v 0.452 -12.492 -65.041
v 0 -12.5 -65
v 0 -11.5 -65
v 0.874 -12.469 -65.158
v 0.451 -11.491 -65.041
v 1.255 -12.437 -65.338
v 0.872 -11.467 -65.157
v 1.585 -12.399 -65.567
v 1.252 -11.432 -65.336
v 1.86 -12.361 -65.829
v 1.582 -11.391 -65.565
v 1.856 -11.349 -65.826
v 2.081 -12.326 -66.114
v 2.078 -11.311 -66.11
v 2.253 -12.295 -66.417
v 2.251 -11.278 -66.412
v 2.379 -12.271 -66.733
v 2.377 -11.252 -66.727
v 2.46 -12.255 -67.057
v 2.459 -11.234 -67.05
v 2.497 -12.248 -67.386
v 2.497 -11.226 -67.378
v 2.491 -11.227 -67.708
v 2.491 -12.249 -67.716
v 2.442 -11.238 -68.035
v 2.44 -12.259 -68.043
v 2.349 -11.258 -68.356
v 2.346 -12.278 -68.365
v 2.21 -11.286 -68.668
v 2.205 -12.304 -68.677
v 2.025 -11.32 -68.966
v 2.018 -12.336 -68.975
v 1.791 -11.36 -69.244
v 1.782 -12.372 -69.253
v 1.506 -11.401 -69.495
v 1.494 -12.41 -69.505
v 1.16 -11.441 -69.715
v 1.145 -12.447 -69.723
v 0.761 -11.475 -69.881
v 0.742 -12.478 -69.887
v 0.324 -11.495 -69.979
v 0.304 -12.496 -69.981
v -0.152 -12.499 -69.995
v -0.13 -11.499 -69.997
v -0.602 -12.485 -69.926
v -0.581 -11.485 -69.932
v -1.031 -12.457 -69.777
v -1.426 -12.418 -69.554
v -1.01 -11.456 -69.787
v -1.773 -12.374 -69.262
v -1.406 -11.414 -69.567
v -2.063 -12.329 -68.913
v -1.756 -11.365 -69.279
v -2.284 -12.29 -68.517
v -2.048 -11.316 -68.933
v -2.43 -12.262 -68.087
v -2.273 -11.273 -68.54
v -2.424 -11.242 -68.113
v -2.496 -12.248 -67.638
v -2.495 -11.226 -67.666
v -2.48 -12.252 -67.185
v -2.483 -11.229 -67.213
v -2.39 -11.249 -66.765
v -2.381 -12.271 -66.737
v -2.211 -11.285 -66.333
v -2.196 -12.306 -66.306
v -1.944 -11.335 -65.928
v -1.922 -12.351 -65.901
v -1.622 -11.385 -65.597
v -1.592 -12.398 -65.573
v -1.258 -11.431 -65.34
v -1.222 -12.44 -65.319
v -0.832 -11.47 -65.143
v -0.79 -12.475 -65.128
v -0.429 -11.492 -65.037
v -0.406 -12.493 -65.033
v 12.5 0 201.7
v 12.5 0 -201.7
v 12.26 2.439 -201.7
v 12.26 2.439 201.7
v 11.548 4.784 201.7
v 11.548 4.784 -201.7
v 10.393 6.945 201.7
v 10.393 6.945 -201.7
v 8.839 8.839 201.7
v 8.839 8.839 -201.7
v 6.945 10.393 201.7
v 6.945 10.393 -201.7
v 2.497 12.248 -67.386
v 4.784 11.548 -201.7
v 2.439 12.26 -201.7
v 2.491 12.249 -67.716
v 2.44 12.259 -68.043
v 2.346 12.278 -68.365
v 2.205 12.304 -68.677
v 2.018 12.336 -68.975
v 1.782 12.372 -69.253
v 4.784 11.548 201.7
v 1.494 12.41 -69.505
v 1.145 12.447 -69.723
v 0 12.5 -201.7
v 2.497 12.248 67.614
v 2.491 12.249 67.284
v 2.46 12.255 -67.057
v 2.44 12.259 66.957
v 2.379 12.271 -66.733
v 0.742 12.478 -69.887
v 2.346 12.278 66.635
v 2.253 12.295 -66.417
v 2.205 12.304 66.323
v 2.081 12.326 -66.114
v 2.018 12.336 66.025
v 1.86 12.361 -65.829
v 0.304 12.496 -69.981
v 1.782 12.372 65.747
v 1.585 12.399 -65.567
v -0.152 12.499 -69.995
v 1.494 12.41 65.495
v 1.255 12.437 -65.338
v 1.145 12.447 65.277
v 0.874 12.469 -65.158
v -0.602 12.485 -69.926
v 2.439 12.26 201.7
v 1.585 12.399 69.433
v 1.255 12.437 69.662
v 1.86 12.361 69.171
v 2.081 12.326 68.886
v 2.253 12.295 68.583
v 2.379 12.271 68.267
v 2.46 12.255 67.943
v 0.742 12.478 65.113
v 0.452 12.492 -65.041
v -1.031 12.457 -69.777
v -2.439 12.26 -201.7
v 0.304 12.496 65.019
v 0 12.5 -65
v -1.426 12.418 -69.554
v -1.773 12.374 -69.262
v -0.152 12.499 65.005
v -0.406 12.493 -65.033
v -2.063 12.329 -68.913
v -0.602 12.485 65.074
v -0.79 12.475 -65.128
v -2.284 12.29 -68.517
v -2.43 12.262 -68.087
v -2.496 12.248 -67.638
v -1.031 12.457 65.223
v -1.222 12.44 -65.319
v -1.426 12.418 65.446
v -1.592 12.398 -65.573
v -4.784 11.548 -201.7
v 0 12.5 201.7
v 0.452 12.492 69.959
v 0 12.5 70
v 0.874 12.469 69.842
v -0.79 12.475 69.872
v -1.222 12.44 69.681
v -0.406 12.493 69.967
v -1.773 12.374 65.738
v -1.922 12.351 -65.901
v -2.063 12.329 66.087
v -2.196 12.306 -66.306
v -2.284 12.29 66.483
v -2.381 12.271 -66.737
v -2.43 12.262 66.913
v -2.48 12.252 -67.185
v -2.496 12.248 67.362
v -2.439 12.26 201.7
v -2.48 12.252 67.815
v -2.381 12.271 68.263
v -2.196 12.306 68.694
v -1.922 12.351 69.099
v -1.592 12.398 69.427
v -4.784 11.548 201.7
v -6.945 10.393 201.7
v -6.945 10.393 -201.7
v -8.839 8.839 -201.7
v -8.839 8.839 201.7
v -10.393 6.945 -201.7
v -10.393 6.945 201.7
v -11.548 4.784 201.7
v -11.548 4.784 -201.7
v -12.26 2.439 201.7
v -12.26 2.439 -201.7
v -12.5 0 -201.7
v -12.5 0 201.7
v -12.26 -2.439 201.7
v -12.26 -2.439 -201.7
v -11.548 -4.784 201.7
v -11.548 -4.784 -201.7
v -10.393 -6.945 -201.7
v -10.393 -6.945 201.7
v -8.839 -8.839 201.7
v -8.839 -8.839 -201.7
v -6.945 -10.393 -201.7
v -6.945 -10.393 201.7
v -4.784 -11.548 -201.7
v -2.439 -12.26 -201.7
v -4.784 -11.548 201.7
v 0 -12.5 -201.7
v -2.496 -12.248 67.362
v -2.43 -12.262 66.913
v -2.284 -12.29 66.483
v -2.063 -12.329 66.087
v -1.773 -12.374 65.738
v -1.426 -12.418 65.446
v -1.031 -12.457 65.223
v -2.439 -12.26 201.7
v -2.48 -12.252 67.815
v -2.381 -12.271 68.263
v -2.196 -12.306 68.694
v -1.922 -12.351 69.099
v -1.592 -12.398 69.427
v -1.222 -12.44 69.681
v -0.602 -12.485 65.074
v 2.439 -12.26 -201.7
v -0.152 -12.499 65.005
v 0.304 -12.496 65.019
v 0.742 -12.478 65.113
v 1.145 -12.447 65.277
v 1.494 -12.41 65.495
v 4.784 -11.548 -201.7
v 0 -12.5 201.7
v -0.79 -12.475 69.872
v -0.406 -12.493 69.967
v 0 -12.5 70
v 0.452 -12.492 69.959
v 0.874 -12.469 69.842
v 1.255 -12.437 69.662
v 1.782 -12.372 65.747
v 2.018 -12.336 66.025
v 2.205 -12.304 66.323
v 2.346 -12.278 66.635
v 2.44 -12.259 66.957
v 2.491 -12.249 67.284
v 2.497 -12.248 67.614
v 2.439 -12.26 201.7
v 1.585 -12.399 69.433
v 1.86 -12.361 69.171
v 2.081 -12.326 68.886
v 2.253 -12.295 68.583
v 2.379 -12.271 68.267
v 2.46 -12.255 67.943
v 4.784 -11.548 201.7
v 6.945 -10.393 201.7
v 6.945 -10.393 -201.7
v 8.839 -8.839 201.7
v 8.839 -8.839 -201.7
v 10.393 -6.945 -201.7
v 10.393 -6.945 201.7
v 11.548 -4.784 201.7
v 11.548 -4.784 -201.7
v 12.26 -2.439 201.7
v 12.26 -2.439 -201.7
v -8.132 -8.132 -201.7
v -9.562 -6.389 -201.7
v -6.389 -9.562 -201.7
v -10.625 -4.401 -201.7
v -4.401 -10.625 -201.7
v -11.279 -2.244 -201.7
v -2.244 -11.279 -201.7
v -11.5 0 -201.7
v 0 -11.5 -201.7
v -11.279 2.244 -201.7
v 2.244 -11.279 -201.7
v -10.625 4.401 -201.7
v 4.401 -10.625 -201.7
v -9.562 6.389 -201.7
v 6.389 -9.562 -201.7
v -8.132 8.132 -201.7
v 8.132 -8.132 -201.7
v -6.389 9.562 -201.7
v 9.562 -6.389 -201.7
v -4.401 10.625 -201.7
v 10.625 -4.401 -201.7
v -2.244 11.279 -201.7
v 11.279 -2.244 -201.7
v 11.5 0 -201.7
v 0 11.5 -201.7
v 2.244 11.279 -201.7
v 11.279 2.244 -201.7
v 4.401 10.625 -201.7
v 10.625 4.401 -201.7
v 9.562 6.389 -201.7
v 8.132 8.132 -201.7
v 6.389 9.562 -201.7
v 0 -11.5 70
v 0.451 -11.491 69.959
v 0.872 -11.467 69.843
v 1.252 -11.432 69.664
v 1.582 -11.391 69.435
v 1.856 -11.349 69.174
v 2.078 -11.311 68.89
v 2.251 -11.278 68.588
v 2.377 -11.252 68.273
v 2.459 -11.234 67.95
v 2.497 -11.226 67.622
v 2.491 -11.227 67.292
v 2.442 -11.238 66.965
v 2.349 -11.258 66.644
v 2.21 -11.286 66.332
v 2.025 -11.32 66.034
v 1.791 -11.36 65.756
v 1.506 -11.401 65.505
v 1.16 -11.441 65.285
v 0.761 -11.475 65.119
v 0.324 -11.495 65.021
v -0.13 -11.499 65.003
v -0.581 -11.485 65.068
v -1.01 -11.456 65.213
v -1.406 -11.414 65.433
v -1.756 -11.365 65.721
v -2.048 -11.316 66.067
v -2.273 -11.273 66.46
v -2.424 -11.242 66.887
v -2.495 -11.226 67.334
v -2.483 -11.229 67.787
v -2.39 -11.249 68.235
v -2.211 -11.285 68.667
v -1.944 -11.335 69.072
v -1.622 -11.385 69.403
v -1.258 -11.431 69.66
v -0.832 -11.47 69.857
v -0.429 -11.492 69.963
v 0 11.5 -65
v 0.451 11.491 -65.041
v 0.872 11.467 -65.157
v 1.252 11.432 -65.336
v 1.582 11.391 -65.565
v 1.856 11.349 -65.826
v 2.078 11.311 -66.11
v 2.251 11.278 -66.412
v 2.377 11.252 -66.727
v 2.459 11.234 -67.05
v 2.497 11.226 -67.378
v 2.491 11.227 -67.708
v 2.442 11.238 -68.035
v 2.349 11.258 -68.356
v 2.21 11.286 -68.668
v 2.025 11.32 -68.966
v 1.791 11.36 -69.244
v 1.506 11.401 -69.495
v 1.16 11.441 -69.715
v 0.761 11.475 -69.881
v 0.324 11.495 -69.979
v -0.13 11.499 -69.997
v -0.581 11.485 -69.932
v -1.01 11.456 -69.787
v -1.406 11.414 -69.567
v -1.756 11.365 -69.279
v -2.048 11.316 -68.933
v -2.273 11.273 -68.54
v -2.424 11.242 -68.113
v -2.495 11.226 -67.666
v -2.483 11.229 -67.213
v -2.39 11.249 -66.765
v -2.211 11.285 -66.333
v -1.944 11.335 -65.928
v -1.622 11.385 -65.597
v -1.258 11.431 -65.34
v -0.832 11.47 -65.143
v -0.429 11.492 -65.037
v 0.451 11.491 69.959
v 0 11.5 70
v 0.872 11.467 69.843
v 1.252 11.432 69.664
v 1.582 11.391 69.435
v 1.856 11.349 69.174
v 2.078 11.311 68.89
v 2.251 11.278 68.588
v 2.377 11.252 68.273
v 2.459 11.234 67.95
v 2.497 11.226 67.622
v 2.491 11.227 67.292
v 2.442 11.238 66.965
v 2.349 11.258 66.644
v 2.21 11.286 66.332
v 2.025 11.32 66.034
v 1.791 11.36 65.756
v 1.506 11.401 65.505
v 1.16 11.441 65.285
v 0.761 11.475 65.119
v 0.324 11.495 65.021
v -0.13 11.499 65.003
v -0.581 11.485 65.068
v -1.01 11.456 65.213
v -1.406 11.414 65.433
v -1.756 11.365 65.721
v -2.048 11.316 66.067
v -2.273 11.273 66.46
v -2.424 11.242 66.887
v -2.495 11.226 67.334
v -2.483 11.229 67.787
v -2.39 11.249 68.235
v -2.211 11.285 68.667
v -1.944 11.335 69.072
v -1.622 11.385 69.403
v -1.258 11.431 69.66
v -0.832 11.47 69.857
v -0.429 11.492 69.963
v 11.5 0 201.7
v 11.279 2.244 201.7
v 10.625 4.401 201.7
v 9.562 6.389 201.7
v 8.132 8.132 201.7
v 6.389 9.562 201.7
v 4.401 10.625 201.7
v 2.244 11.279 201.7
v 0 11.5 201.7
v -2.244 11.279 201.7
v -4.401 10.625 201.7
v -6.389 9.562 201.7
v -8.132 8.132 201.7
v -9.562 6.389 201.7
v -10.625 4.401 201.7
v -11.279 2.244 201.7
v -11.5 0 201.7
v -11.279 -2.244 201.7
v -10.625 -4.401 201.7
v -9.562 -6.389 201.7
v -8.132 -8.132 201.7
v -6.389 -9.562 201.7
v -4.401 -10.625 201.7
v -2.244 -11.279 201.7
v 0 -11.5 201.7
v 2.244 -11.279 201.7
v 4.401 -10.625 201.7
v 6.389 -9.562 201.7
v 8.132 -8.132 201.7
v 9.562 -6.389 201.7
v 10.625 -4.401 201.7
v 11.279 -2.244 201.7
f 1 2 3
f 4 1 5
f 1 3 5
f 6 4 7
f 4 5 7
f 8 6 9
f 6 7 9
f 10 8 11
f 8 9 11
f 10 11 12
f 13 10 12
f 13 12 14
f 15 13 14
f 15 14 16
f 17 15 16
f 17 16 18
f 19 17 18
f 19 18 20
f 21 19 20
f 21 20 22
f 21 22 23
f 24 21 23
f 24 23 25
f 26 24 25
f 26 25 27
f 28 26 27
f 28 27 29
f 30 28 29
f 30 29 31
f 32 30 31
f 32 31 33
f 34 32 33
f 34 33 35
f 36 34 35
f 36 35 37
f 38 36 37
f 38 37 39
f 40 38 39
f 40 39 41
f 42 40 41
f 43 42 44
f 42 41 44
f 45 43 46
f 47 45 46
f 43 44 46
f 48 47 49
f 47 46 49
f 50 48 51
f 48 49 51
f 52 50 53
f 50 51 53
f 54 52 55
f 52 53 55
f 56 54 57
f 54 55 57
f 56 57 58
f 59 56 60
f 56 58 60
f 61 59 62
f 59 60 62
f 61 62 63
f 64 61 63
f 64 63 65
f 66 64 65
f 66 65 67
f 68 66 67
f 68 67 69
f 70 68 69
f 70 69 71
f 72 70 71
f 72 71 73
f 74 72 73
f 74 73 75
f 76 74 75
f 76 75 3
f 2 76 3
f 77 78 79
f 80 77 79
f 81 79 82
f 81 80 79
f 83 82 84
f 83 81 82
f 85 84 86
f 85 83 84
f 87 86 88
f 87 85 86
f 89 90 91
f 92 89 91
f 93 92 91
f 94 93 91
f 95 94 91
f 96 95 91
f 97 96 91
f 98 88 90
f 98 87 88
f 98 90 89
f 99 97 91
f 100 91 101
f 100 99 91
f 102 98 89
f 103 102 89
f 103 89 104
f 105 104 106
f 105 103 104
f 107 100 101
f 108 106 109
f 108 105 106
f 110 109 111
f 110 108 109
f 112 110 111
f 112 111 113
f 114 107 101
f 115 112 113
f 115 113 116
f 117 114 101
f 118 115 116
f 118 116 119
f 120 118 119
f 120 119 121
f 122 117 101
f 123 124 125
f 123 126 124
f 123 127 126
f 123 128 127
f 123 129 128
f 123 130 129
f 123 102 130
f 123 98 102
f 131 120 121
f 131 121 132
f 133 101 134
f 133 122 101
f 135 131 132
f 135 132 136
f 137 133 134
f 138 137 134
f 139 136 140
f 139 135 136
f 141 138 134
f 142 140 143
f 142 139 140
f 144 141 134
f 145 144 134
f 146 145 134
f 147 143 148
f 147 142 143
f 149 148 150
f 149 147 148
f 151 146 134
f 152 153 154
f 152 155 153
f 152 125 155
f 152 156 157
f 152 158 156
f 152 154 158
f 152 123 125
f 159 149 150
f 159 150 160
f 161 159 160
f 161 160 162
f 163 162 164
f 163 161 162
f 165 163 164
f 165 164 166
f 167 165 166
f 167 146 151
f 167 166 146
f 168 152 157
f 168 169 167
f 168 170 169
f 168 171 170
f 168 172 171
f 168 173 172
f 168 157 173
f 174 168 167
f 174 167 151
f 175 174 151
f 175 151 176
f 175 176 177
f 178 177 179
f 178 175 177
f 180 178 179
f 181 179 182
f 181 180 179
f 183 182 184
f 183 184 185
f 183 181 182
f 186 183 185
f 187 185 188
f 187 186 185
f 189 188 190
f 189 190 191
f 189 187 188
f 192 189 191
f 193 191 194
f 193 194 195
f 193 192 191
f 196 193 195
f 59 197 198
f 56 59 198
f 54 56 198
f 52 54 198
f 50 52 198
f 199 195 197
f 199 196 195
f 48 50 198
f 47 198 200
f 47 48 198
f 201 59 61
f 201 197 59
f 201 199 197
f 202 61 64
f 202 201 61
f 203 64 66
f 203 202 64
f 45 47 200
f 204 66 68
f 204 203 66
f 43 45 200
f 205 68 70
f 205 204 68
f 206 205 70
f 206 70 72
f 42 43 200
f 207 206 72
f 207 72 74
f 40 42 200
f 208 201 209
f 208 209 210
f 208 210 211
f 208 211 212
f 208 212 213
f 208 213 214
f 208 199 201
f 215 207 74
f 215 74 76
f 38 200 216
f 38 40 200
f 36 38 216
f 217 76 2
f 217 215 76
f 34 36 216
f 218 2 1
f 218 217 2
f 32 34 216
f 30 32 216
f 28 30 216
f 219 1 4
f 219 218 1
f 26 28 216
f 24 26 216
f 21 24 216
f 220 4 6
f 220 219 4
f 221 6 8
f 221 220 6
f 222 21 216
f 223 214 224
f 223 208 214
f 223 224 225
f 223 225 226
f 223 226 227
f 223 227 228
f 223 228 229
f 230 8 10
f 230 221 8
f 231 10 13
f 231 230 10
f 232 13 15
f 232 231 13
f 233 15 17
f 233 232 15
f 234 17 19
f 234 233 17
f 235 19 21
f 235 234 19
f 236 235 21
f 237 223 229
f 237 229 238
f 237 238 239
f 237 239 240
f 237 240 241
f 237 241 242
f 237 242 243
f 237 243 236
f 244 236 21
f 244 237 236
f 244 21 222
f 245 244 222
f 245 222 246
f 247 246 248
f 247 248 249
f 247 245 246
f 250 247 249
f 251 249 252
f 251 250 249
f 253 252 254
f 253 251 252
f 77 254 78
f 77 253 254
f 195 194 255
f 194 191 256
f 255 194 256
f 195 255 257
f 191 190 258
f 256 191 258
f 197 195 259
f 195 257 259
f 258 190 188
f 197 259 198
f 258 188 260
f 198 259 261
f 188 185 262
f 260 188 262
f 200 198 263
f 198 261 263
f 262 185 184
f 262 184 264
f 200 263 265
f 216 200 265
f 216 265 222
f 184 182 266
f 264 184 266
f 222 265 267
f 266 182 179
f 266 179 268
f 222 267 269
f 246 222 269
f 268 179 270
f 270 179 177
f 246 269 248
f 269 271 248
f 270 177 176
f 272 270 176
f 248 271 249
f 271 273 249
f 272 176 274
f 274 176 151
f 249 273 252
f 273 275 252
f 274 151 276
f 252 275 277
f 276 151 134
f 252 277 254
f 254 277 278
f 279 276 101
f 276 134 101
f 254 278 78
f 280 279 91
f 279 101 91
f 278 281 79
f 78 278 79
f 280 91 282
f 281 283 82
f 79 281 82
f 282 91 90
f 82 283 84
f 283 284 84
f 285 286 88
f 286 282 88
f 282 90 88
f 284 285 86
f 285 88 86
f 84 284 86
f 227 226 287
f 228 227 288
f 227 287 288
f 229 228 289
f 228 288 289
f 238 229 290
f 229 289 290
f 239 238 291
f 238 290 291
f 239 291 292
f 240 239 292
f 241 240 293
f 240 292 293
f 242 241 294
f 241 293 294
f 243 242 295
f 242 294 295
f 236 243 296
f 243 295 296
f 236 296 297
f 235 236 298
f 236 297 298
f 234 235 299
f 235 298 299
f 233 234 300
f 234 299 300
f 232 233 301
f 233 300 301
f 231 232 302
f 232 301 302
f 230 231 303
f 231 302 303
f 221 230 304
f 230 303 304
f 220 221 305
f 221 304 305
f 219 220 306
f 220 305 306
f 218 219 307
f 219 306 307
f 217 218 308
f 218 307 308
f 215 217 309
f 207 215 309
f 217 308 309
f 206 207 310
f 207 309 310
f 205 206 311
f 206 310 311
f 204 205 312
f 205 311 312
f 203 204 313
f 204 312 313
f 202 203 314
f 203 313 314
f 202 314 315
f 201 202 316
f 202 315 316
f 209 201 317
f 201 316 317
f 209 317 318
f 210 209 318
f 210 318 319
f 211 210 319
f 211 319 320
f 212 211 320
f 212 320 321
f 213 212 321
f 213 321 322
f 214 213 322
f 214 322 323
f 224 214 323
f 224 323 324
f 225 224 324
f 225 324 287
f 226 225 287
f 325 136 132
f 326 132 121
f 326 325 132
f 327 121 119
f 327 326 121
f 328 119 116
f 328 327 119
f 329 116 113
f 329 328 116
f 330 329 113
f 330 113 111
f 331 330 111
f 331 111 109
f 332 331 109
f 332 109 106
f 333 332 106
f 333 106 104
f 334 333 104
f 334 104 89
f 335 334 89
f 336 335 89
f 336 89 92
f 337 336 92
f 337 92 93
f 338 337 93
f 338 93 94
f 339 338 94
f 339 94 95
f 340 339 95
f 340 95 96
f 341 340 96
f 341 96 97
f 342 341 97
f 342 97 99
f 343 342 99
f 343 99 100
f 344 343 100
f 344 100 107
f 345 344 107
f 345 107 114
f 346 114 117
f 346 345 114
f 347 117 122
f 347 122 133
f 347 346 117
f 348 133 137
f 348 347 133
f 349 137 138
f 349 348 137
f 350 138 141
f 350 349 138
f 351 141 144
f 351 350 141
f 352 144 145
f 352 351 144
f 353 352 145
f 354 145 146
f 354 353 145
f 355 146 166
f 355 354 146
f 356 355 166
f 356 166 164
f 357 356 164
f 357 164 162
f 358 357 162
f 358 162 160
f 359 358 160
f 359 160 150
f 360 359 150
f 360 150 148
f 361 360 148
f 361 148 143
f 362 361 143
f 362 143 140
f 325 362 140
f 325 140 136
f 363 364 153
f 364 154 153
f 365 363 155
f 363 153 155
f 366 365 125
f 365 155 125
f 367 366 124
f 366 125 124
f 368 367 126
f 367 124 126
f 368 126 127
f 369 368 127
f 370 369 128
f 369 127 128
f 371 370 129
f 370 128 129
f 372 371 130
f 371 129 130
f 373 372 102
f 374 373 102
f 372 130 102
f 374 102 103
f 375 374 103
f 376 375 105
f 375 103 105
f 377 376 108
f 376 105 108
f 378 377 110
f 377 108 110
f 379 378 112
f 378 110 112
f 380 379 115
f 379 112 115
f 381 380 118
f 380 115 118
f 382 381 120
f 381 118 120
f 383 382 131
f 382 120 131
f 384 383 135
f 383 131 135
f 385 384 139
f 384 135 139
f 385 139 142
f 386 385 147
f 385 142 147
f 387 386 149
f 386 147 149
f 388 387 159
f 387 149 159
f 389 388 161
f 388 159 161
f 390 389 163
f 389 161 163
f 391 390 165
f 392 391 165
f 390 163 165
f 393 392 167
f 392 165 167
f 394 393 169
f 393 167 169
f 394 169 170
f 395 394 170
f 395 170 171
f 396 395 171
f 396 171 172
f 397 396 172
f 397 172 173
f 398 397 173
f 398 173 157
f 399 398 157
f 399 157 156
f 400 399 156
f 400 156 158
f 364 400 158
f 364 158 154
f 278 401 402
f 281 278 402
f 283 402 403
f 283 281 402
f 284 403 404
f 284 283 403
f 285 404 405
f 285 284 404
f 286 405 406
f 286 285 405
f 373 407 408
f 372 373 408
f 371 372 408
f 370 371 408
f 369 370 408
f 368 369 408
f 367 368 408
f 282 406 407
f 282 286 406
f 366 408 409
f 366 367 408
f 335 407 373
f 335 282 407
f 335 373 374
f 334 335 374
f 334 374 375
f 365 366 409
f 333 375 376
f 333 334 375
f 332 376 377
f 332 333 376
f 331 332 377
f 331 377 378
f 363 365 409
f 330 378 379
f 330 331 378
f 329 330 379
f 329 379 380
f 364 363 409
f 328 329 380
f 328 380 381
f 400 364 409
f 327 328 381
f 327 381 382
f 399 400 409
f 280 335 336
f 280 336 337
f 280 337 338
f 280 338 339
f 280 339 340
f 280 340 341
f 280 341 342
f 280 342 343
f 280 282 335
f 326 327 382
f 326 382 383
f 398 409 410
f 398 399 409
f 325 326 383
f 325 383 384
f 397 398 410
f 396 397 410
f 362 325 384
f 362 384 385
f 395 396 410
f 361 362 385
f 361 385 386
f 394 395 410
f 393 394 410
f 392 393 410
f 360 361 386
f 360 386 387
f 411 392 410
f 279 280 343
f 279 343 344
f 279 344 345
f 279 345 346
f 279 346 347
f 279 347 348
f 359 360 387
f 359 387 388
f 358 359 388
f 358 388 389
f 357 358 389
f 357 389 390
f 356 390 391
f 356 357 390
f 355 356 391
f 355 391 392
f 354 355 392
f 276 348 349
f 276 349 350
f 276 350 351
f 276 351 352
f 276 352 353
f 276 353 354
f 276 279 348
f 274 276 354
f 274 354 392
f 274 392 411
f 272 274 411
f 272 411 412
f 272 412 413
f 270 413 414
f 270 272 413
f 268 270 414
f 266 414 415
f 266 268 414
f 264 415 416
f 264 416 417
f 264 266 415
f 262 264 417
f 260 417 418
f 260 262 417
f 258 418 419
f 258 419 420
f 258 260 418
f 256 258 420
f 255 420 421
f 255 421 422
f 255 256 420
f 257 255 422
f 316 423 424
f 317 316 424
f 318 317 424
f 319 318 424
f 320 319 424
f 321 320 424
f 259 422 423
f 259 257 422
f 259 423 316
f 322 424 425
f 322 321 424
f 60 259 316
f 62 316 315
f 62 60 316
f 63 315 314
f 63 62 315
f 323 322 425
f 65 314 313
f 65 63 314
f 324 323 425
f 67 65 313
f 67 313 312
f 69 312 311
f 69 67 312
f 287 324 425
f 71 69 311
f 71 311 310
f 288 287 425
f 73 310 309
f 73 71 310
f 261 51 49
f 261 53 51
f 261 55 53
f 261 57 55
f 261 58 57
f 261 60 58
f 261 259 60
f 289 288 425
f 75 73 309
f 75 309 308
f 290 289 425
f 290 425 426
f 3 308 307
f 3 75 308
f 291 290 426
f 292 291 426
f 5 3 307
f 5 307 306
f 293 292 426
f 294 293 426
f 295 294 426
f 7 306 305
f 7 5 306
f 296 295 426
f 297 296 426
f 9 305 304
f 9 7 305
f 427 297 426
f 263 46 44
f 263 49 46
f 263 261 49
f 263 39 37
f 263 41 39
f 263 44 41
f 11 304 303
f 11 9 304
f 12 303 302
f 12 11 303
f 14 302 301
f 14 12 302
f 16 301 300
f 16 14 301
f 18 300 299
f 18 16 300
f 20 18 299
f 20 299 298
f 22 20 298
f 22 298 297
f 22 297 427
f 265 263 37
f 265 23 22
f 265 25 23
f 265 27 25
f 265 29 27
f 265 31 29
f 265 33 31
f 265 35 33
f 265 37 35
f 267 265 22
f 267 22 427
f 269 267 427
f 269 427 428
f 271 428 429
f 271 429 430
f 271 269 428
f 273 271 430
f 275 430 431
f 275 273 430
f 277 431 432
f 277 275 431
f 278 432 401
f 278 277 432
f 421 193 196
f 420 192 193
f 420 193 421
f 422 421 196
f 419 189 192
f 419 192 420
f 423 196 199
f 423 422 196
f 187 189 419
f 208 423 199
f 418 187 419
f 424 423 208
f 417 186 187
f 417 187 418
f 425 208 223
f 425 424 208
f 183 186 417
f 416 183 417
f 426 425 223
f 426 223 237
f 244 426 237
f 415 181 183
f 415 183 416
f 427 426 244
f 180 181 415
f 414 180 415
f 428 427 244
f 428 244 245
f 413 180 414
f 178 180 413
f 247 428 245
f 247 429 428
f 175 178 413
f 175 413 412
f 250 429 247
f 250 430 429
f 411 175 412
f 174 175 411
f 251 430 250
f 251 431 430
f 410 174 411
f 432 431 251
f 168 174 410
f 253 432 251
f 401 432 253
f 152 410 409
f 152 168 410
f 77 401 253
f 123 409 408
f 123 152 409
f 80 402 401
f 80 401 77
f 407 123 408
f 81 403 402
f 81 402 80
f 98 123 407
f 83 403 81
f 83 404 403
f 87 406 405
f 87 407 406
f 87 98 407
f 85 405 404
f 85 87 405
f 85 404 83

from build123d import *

# Parameters (mm, degrees)
SKETCH_1_R          = 12.5
SKETCH_1_R_2        = 11.5
EXTRUDE_1_DEPTH     = 201.7
SKETCH_3_R          = 2.5
CUT_EXTRUDE_1_DEPTH = 50


with BuildPart() as part:
    # 草图1 → 凸台-拉伸1 (new, symmetric)
    with BuildSketch(Plane.XY):
        Circle(SKETCH_1_R)
        Circle(SKETCH_1_R_2, mode=Mode.SUBTRACT)
    extrude(amount=EXTRUDE_1_DEPTH, both=True)

    # 草图3 → 切除-拉伸1 (cut, symmetric)
    with BuildSketch(Plane(origin=(0, 0, 0), x_dir=(1, 0, 0), z_dir=(0, 1, 0))):
        with Locations(Location((0, 67.5, 0), (0, 0, 270))):
            Circle(SKETCH_3_R)
        with Locations(Location((0, -67.5, 0), (0, 0, 270))):
            Circle(SKETCH_3_R)
    extrude(amount=CUT_EXTRUDE_1_DEPTH, both=True, mode=Mode.SUBTRACT)


solid = part.part
